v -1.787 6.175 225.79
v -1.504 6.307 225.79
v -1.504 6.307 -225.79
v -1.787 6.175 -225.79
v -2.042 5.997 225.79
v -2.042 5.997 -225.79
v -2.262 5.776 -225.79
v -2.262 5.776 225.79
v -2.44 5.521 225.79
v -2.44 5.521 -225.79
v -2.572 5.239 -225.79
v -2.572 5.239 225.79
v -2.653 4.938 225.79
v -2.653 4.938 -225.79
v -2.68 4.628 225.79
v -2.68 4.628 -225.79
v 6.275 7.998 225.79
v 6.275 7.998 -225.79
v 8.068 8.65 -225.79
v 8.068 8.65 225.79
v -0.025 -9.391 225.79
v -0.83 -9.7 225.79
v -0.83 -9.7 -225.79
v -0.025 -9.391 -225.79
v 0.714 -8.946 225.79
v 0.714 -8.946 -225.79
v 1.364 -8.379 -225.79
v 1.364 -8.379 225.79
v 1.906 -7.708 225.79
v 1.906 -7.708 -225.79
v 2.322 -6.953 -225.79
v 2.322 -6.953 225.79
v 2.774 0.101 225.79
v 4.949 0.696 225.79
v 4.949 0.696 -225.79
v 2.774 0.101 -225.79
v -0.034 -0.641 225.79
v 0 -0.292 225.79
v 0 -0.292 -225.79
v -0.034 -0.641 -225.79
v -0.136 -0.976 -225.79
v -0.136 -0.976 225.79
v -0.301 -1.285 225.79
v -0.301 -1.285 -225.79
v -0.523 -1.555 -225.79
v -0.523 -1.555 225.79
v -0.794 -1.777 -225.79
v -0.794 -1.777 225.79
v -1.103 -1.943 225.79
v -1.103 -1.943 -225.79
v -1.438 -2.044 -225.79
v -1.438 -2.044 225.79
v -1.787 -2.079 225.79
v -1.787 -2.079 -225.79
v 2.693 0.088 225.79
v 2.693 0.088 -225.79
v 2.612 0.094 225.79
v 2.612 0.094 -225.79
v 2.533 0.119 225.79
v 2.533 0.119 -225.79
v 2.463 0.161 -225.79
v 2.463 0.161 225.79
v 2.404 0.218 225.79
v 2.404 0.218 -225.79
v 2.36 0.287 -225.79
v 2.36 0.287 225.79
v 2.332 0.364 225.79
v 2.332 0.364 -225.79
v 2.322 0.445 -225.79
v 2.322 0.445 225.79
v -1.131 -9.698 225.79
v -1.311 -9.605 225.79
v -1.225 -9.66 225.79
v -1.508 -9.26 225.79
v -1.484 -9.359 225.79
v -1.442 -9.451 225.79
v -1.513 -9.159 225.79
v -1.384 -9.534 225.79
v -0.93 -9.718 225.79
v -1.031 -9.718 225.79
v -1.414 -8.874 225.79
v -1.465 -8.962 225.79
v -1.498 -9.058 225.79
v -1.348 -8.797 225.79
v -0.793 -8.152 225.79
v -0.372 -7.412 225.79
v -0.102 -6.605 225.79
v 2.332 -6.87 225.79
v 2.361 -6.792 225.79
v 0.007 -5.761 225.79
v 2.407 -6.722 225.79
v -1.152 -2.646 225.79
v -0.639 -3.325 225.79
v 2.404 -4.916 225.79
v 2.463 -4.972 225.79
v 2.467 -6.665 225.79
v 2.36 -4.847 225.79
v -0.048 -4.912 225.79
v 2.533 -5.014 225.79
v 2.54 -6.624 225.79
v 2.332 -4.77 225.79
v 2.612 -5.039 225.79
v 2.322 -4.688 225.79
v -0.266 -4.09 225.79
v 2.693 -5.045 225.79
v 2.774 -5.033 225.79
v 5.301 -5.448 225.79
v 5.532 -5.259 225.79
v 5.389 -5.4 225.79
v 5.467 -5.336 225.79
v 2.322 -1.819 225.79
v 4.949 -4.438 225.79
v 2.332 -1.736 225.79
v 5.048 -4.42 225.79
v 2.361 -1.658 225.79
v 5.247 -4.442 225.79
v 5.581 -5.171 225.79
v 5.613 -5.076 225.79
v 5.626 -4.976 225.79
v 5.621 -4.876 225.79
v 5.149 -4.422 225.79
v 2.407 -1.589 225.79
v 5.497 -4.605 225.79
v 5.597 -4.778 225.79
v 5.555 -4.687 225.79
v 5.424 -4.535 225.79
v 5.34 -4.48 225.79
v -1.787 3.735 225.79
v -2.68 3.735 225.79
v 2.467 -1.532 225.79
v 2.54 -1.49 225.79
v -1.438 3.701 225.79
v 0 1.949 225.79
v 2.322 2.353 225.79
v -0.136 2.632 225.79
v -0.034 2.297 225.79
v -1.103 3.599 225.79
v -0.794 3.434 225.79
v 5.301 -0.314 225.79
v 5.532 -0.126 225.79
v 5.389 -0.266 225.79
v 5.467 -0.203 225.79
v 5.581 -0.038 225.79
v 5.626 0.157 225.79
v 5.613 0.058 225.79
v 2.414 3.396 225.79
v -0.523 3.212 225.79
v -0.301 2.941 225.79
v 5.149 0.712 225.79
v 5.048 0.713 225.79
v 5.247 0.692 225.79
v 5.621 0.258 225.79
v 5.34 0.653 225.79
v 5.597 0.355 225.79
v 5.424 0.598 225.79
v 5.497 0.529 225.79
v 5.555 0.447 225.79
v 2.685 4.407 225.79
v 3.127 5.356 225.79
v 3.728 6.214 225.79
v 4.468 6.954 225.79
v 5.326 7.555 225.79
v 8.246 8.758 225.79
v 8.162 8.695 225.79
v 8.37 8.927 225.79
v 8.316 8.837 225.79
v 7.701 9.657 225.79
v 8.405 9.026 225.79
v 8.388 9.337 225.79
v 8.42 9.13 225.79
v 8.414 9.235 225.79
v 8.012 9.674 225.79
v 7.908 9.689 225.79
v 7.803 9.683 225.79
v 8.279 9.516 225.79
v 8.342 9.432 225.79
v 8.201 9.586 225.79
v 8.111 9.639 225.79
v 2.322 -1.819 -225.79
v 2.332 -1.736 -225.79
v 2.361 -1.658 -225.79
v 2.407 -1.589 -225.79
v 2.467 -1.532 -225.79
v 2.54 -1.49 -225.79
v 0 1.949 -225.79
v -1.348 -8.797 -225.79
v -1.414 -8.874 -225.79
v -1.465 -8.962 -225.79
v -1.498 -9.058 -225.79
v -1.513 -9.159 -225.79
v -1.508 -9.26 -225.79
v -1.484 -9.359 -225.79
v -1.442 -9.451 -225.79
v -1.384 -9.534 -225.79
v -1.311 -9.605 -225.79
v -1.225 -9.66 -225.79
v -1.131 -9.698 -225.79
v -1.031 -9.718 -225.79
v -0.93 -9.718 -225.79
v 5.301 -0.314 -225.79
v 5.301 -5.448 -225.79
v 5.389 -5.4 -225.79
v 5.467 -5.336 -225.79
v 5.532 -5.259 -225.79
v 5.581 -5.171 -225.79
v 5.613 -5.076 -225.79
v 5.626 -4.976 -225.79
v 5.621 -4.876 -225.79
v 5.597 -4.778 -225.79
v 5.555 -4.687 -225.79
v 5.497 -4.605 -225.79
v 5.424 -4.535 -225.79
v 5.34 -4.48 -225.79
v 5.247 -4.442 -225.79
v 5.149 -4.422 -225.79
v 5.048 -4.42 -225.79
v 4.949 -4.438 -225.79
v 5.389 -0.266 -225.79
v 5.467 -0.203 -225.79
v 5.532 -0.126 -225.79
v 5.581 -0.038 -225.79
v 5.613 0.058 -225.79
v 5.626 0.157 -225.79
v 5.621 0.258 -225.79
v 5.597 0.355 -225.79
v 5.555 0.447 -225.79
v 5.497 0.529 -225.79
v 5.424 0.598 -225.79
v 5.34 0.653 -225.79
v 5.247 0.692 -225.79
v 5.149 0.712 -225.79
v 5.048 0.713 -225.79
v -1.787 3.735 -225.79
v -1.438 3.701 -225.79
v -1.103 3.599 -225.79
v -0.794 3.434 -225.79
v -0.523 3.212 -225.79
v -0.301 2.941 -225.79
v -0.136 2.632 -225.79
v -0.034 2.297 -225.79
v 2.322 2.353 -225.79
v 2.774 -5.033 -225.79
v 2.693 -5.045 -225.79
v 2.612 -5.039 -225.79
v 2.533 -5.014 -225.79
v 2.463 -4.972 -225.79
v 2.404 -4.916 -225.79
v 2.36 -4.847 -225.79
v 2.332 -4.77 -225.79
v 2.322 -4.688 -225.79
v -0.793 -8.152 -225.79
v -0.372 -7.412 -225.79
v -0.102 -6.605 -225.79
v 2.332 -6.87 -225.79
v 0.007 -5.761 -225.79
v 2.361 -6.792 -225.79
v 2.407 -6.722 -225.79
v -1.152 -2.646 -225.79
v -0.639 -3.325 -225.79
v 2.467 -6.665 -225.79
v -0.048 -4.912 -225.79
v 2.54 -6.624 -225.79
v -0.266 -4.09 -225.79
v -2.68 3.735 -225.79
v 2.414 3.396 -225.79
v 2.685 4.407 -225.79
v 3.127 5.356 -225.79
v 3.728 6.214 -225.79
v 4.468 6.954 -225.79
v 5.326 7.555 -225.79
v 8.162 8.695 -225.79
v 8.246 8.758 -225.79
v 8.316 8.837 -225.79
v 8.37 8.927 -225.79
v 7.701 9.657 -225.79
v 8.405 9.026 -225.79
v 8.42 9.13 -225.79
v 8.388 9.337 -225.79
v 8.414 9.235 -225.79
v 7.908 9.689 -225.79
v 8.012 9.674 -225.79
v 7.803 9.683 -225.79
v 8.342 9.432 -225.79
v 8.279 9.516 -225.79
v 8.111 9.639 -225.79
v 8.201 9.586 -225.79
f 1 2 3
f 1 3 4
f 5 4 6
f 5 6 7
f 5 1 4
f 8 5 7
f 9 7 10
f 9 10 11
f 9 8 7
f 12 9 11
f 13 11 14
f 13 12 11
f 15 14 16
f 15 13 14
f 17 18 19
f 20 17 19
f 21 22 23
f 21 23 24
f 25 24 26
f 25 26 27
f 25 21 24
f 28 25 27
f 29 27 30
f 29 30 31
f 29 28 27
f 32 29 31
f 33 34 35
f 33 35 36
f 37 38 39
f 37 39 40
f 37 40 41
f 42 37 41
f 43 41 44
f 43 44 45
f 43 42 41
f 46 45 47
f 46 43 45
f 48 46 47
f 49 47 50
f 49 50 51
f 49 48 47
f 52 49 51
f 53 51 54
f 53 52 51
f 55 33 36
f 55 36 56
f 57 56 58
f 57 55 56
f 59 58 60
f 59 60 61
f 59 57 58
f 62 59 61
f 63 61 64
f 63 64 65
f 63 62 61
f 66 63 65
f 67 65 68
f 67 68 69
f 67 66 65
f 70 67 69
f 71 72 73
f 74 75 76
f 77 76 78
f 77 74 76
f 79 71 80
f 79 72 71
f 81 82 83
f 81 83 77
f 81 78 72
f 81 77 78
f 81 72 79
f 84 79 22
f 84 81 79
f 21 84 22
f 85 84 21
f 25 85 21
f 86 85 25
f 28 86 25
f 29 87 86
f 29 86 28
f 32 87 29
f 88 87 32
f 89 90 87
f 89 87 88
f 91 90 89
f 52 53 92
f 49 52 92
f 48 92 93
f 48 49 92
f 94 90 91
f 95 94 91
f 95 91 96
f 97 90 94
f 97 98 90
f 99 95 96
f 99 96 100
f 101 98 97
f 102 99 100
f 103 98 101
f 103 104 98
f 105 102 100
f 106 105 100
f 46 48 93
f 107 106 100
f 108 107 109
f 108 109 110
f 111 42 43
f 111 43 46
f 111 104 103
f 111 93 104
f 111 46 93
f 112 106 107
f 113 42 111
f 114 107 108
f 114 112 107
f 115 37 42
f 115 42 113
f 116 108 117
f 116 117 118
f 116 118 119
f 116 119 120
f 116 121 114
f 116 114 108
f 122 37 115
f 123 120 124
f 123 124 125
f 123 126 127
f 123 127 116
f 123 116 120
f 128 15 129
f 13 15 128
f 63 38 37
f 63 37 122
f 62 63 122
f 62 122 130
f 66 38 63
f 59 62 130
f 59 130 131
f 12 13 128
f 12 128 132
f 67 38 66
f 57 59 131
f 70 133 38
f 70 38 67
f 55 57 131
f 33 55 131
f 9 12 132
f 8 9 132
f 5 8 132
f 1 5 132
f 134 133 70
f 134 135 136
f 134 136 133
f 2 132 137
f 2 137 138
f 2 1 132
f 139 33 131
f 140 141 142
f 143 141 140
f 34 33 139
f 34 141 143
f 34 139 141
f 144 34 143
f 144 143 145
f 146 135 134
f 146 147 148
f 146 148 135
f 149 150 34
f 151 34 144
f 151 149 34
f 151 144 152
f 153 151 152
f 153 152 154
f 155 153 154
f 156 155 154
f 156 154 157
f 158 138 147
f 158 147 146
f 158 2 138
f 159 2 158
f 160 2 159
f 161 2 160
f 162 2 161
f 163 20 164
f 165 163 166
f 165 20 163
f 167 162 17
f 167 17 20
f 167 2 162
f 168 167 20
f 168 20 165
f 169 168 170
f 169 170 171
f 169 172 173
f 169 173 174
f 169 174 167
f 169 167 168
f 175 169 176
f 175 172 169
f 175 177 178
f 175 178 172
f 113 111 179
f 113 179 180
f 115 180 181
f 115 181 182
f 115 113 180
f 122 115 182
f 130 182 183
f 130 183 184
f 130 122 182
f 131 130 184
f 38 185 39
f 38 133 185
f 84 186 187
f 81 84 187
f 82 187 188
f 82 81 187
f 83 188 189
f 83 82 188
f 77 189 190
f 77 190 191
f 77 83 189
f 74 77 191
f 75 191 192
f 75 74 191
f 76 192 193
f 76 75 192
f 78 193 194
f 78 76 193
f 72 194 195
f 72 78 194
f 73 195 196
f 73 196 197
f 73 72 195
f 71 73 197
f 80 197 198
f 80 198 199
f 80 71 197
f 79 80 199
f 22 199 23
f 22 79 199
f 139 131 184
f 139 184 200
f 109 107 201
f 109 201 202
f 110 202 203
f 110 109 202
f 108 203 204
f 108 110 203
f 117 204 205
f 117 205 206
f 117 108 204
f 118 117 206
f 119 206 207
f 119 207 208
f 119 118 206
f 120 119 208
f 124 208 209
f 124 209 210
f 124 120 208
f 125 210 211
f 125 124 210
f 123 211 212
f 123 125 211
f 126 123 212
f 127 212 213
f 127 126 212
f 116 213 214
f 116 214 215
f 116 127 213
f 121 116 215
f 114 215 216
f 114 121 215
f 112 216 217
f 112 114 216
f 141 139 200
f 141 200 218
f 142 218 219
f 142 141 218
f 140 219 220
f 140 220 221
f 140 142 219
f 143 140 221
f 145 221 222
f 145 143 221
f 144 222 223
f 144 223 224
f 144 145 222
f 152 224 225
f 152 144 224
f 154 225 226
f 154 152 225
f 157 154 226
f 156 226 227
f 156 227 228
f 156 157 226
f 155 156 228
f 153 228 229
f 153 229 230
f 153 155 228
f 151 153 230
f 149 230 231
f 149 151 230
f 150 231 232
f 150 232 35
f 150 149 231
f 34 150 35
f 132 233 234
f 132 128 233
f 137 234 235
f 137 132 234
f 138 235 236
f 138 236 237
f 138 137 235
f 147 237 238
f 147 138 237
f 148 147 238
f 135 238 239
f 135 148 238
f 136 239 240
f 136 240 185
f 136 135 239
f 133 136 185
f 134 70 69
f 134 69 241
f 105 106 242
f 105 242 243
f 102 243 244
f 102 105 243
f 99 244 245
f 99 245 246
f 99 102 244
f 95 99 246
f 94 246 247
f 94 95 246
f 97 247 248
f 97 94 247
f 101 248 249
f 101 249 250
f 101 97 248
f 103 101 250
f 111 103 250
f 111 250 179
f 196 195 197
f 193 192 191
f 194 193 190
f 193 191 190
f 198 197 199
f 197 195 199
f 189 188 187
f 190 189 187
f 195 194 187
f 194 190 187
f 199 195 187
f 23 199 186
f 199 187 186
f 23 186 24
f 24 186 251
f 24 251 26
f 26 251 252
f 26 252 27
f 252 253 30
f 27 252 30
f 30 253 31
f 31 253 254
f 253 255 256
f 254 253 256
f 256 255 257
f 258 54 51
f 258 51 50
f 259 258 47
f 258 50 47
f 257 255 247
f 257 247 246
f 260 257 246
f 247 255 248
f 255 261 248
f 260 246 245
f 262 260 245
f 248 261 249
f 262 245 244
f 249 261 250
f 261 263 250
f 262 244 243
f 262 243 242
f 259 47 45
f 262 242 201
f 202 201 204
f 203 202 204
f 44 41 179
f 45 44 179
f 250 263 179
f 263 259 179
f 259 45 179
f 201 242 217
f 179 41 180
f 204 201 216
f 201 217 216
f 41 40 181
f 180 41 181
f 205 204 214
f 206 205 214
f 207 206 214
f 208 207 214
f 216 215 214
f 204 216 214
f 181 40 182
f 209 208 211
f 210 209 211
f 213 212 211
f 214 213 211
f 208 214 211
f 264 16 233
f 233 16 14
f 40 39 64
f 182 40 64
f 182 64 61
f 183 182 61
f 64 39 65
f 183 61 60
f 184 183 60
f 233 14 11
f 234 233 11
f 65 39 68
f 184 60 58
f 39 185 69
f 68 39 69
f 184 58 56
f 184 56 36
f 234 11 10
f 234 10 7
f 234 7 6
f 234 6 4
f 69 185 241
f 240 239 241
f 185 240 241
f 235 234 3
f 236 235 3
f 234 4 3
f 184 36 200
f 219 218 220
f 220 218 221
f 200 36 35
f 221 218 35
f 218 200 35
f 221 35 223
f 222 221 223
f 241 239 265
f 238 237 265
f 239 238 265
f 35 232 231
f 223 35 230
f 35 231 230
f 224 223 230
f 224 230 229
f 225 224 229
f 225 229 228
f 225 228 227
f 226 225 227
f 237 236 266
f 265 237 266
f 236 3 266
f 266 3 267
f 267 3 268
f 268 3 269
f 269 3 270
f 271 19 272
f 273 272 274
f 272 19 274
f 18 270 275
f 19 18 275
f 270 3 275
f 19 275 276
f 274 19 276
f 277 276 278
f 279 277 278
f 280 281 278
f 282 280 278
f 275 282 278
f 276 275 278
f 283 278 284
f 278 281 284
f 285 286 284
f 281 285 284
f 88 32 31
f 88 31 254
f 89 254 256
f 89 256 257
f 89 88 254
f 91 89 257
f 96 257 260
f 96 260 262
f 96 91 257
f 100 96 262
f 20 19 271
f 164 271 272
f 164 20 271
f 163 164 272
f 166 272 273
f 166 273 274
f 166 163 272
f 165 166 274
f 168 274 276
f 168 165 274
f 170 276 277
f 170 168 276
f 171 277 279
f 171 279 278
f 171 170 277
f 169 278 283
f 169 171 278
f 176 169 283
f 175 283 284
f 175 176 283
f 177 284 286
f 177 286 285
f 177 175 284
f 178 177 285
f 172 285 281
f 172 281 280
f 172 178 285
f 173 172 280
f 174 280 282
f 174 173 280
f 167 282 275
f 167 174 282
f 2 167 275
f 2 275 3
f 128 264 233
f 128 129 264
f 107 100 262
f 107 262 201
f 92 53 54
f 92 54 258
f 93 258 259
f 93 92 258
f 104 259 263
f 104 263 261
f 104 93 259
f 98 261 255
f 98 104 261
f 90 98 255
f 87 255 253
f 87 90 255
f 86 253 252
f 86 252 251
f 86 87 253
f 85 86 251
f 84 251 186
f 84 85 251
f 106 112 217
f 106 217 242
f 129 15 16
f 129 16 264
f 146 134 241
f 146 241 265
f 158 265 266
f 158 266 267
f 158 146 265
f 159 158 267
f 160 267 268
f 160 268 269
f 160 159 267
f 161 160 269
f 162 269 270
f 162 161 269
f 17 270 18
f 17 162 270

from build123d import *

# Parameters (mm, degrees)
BOSS_EXTRUDE1_DEPTH = 225.79


with BuildPart() as part:
    # Sketch3 → Boss-Extrude1 (new, symmetric)
    with BuildSketch(Plane.XY):
        with BuildLine():
            Line((0, 1.948577375), (0, -0.29197505))
            ThreePointArc((0, -0.29197505), (-0.523261774, -1.555240722), (-1.786527446, -2.078502496))
            ThreePointArc((-1.786527446, -2.078502496), (0, -5.335508002), (-1.348017062, -8.797099424))
            ThreePointArc((-1.348017062, -8.797099424), (-1.44249717, -9.451284226), (-0.829990586, -9.699719191))
            ThreePointArc((-0.829990586, -9.699719191), (1.051740503, -8.676690662), (2.322485679, -6.952536967))
            ThreePointArc((2.322485679, -6.952536967), (2.381708142, -6.755524983), (2.539743588, -6.623821455))
            Line((2.539743588, -6.623821455), (5.300722676, -5.447520291))
            ThreePointArc((5.300722676, -5.447520291), (5.596816097, -4.778241367), (4.949120021, -4.437513638))
            Line((4.949120021, -4.437513638), (2.774145358, -5.033000346))
            ThreePointArc((2.774145358, -5.033000346), (2.463049453, -4.972438368), (2.322485679, -4.68837809))
            Line((2.322485679, -4.68837809), (2.322485679, -1.81903037))
            ThreePointArc((2.322485679, -1.81903037), (2.381708142, -1.622018386), (2.539743588, -1.490314858))
            Line((2.539743588, -1.490314858), (5.300722676, -0.314013694))
            ThreePointArc((5.300722676, -0.314013694), (5.596816097, 0.35526523), (4.949120021, 0.695992958))
            Line((4.949120021, 0.695992958), (2.774145358, 0.10050625))
            ThreePointArc((2.774145358, 0.10050625), (2.463049453, 0.161068229), (2.322485679, 0.445128506))
            Line((2.322485679, 0.445128506), (2.322485679, 2.352673629))
            ThreePointArc((2.322485679, 2.352673629), (3.408861985, 5.798219074), (6.275053034, 7.997524819))
            Line((6.275053034, 7.997524819), (8.06755911, 8.649943675))
            ThreePointArc((8.06755911, 8.649943675), (8.387886595, 9.336888184), (7.700942086, 9.65721567))
            Line((7.700942086, 9.65721567), (-1.504292096, 6.306784428))
            ThreePointArc((-1.504292096, 6.306784428), (-2.356701332, 5.652707816), (-2.679791168, 4.627997771))
            Line((-2.679791168, 4.627997771), (-2.679791168, 3.73510482))
            Line((-2.679791168, 3.73510482), (-1.786527446, 3.73510482))
            ThreePointArc((-1.786527446, 3.73510482), (-0.523261774, 3.211843046), (0, 1.948577375))
        make_face()
    extrude(amount=BOSS_EXTRUDE1_DEPTH, both=True)


solid = part.part
